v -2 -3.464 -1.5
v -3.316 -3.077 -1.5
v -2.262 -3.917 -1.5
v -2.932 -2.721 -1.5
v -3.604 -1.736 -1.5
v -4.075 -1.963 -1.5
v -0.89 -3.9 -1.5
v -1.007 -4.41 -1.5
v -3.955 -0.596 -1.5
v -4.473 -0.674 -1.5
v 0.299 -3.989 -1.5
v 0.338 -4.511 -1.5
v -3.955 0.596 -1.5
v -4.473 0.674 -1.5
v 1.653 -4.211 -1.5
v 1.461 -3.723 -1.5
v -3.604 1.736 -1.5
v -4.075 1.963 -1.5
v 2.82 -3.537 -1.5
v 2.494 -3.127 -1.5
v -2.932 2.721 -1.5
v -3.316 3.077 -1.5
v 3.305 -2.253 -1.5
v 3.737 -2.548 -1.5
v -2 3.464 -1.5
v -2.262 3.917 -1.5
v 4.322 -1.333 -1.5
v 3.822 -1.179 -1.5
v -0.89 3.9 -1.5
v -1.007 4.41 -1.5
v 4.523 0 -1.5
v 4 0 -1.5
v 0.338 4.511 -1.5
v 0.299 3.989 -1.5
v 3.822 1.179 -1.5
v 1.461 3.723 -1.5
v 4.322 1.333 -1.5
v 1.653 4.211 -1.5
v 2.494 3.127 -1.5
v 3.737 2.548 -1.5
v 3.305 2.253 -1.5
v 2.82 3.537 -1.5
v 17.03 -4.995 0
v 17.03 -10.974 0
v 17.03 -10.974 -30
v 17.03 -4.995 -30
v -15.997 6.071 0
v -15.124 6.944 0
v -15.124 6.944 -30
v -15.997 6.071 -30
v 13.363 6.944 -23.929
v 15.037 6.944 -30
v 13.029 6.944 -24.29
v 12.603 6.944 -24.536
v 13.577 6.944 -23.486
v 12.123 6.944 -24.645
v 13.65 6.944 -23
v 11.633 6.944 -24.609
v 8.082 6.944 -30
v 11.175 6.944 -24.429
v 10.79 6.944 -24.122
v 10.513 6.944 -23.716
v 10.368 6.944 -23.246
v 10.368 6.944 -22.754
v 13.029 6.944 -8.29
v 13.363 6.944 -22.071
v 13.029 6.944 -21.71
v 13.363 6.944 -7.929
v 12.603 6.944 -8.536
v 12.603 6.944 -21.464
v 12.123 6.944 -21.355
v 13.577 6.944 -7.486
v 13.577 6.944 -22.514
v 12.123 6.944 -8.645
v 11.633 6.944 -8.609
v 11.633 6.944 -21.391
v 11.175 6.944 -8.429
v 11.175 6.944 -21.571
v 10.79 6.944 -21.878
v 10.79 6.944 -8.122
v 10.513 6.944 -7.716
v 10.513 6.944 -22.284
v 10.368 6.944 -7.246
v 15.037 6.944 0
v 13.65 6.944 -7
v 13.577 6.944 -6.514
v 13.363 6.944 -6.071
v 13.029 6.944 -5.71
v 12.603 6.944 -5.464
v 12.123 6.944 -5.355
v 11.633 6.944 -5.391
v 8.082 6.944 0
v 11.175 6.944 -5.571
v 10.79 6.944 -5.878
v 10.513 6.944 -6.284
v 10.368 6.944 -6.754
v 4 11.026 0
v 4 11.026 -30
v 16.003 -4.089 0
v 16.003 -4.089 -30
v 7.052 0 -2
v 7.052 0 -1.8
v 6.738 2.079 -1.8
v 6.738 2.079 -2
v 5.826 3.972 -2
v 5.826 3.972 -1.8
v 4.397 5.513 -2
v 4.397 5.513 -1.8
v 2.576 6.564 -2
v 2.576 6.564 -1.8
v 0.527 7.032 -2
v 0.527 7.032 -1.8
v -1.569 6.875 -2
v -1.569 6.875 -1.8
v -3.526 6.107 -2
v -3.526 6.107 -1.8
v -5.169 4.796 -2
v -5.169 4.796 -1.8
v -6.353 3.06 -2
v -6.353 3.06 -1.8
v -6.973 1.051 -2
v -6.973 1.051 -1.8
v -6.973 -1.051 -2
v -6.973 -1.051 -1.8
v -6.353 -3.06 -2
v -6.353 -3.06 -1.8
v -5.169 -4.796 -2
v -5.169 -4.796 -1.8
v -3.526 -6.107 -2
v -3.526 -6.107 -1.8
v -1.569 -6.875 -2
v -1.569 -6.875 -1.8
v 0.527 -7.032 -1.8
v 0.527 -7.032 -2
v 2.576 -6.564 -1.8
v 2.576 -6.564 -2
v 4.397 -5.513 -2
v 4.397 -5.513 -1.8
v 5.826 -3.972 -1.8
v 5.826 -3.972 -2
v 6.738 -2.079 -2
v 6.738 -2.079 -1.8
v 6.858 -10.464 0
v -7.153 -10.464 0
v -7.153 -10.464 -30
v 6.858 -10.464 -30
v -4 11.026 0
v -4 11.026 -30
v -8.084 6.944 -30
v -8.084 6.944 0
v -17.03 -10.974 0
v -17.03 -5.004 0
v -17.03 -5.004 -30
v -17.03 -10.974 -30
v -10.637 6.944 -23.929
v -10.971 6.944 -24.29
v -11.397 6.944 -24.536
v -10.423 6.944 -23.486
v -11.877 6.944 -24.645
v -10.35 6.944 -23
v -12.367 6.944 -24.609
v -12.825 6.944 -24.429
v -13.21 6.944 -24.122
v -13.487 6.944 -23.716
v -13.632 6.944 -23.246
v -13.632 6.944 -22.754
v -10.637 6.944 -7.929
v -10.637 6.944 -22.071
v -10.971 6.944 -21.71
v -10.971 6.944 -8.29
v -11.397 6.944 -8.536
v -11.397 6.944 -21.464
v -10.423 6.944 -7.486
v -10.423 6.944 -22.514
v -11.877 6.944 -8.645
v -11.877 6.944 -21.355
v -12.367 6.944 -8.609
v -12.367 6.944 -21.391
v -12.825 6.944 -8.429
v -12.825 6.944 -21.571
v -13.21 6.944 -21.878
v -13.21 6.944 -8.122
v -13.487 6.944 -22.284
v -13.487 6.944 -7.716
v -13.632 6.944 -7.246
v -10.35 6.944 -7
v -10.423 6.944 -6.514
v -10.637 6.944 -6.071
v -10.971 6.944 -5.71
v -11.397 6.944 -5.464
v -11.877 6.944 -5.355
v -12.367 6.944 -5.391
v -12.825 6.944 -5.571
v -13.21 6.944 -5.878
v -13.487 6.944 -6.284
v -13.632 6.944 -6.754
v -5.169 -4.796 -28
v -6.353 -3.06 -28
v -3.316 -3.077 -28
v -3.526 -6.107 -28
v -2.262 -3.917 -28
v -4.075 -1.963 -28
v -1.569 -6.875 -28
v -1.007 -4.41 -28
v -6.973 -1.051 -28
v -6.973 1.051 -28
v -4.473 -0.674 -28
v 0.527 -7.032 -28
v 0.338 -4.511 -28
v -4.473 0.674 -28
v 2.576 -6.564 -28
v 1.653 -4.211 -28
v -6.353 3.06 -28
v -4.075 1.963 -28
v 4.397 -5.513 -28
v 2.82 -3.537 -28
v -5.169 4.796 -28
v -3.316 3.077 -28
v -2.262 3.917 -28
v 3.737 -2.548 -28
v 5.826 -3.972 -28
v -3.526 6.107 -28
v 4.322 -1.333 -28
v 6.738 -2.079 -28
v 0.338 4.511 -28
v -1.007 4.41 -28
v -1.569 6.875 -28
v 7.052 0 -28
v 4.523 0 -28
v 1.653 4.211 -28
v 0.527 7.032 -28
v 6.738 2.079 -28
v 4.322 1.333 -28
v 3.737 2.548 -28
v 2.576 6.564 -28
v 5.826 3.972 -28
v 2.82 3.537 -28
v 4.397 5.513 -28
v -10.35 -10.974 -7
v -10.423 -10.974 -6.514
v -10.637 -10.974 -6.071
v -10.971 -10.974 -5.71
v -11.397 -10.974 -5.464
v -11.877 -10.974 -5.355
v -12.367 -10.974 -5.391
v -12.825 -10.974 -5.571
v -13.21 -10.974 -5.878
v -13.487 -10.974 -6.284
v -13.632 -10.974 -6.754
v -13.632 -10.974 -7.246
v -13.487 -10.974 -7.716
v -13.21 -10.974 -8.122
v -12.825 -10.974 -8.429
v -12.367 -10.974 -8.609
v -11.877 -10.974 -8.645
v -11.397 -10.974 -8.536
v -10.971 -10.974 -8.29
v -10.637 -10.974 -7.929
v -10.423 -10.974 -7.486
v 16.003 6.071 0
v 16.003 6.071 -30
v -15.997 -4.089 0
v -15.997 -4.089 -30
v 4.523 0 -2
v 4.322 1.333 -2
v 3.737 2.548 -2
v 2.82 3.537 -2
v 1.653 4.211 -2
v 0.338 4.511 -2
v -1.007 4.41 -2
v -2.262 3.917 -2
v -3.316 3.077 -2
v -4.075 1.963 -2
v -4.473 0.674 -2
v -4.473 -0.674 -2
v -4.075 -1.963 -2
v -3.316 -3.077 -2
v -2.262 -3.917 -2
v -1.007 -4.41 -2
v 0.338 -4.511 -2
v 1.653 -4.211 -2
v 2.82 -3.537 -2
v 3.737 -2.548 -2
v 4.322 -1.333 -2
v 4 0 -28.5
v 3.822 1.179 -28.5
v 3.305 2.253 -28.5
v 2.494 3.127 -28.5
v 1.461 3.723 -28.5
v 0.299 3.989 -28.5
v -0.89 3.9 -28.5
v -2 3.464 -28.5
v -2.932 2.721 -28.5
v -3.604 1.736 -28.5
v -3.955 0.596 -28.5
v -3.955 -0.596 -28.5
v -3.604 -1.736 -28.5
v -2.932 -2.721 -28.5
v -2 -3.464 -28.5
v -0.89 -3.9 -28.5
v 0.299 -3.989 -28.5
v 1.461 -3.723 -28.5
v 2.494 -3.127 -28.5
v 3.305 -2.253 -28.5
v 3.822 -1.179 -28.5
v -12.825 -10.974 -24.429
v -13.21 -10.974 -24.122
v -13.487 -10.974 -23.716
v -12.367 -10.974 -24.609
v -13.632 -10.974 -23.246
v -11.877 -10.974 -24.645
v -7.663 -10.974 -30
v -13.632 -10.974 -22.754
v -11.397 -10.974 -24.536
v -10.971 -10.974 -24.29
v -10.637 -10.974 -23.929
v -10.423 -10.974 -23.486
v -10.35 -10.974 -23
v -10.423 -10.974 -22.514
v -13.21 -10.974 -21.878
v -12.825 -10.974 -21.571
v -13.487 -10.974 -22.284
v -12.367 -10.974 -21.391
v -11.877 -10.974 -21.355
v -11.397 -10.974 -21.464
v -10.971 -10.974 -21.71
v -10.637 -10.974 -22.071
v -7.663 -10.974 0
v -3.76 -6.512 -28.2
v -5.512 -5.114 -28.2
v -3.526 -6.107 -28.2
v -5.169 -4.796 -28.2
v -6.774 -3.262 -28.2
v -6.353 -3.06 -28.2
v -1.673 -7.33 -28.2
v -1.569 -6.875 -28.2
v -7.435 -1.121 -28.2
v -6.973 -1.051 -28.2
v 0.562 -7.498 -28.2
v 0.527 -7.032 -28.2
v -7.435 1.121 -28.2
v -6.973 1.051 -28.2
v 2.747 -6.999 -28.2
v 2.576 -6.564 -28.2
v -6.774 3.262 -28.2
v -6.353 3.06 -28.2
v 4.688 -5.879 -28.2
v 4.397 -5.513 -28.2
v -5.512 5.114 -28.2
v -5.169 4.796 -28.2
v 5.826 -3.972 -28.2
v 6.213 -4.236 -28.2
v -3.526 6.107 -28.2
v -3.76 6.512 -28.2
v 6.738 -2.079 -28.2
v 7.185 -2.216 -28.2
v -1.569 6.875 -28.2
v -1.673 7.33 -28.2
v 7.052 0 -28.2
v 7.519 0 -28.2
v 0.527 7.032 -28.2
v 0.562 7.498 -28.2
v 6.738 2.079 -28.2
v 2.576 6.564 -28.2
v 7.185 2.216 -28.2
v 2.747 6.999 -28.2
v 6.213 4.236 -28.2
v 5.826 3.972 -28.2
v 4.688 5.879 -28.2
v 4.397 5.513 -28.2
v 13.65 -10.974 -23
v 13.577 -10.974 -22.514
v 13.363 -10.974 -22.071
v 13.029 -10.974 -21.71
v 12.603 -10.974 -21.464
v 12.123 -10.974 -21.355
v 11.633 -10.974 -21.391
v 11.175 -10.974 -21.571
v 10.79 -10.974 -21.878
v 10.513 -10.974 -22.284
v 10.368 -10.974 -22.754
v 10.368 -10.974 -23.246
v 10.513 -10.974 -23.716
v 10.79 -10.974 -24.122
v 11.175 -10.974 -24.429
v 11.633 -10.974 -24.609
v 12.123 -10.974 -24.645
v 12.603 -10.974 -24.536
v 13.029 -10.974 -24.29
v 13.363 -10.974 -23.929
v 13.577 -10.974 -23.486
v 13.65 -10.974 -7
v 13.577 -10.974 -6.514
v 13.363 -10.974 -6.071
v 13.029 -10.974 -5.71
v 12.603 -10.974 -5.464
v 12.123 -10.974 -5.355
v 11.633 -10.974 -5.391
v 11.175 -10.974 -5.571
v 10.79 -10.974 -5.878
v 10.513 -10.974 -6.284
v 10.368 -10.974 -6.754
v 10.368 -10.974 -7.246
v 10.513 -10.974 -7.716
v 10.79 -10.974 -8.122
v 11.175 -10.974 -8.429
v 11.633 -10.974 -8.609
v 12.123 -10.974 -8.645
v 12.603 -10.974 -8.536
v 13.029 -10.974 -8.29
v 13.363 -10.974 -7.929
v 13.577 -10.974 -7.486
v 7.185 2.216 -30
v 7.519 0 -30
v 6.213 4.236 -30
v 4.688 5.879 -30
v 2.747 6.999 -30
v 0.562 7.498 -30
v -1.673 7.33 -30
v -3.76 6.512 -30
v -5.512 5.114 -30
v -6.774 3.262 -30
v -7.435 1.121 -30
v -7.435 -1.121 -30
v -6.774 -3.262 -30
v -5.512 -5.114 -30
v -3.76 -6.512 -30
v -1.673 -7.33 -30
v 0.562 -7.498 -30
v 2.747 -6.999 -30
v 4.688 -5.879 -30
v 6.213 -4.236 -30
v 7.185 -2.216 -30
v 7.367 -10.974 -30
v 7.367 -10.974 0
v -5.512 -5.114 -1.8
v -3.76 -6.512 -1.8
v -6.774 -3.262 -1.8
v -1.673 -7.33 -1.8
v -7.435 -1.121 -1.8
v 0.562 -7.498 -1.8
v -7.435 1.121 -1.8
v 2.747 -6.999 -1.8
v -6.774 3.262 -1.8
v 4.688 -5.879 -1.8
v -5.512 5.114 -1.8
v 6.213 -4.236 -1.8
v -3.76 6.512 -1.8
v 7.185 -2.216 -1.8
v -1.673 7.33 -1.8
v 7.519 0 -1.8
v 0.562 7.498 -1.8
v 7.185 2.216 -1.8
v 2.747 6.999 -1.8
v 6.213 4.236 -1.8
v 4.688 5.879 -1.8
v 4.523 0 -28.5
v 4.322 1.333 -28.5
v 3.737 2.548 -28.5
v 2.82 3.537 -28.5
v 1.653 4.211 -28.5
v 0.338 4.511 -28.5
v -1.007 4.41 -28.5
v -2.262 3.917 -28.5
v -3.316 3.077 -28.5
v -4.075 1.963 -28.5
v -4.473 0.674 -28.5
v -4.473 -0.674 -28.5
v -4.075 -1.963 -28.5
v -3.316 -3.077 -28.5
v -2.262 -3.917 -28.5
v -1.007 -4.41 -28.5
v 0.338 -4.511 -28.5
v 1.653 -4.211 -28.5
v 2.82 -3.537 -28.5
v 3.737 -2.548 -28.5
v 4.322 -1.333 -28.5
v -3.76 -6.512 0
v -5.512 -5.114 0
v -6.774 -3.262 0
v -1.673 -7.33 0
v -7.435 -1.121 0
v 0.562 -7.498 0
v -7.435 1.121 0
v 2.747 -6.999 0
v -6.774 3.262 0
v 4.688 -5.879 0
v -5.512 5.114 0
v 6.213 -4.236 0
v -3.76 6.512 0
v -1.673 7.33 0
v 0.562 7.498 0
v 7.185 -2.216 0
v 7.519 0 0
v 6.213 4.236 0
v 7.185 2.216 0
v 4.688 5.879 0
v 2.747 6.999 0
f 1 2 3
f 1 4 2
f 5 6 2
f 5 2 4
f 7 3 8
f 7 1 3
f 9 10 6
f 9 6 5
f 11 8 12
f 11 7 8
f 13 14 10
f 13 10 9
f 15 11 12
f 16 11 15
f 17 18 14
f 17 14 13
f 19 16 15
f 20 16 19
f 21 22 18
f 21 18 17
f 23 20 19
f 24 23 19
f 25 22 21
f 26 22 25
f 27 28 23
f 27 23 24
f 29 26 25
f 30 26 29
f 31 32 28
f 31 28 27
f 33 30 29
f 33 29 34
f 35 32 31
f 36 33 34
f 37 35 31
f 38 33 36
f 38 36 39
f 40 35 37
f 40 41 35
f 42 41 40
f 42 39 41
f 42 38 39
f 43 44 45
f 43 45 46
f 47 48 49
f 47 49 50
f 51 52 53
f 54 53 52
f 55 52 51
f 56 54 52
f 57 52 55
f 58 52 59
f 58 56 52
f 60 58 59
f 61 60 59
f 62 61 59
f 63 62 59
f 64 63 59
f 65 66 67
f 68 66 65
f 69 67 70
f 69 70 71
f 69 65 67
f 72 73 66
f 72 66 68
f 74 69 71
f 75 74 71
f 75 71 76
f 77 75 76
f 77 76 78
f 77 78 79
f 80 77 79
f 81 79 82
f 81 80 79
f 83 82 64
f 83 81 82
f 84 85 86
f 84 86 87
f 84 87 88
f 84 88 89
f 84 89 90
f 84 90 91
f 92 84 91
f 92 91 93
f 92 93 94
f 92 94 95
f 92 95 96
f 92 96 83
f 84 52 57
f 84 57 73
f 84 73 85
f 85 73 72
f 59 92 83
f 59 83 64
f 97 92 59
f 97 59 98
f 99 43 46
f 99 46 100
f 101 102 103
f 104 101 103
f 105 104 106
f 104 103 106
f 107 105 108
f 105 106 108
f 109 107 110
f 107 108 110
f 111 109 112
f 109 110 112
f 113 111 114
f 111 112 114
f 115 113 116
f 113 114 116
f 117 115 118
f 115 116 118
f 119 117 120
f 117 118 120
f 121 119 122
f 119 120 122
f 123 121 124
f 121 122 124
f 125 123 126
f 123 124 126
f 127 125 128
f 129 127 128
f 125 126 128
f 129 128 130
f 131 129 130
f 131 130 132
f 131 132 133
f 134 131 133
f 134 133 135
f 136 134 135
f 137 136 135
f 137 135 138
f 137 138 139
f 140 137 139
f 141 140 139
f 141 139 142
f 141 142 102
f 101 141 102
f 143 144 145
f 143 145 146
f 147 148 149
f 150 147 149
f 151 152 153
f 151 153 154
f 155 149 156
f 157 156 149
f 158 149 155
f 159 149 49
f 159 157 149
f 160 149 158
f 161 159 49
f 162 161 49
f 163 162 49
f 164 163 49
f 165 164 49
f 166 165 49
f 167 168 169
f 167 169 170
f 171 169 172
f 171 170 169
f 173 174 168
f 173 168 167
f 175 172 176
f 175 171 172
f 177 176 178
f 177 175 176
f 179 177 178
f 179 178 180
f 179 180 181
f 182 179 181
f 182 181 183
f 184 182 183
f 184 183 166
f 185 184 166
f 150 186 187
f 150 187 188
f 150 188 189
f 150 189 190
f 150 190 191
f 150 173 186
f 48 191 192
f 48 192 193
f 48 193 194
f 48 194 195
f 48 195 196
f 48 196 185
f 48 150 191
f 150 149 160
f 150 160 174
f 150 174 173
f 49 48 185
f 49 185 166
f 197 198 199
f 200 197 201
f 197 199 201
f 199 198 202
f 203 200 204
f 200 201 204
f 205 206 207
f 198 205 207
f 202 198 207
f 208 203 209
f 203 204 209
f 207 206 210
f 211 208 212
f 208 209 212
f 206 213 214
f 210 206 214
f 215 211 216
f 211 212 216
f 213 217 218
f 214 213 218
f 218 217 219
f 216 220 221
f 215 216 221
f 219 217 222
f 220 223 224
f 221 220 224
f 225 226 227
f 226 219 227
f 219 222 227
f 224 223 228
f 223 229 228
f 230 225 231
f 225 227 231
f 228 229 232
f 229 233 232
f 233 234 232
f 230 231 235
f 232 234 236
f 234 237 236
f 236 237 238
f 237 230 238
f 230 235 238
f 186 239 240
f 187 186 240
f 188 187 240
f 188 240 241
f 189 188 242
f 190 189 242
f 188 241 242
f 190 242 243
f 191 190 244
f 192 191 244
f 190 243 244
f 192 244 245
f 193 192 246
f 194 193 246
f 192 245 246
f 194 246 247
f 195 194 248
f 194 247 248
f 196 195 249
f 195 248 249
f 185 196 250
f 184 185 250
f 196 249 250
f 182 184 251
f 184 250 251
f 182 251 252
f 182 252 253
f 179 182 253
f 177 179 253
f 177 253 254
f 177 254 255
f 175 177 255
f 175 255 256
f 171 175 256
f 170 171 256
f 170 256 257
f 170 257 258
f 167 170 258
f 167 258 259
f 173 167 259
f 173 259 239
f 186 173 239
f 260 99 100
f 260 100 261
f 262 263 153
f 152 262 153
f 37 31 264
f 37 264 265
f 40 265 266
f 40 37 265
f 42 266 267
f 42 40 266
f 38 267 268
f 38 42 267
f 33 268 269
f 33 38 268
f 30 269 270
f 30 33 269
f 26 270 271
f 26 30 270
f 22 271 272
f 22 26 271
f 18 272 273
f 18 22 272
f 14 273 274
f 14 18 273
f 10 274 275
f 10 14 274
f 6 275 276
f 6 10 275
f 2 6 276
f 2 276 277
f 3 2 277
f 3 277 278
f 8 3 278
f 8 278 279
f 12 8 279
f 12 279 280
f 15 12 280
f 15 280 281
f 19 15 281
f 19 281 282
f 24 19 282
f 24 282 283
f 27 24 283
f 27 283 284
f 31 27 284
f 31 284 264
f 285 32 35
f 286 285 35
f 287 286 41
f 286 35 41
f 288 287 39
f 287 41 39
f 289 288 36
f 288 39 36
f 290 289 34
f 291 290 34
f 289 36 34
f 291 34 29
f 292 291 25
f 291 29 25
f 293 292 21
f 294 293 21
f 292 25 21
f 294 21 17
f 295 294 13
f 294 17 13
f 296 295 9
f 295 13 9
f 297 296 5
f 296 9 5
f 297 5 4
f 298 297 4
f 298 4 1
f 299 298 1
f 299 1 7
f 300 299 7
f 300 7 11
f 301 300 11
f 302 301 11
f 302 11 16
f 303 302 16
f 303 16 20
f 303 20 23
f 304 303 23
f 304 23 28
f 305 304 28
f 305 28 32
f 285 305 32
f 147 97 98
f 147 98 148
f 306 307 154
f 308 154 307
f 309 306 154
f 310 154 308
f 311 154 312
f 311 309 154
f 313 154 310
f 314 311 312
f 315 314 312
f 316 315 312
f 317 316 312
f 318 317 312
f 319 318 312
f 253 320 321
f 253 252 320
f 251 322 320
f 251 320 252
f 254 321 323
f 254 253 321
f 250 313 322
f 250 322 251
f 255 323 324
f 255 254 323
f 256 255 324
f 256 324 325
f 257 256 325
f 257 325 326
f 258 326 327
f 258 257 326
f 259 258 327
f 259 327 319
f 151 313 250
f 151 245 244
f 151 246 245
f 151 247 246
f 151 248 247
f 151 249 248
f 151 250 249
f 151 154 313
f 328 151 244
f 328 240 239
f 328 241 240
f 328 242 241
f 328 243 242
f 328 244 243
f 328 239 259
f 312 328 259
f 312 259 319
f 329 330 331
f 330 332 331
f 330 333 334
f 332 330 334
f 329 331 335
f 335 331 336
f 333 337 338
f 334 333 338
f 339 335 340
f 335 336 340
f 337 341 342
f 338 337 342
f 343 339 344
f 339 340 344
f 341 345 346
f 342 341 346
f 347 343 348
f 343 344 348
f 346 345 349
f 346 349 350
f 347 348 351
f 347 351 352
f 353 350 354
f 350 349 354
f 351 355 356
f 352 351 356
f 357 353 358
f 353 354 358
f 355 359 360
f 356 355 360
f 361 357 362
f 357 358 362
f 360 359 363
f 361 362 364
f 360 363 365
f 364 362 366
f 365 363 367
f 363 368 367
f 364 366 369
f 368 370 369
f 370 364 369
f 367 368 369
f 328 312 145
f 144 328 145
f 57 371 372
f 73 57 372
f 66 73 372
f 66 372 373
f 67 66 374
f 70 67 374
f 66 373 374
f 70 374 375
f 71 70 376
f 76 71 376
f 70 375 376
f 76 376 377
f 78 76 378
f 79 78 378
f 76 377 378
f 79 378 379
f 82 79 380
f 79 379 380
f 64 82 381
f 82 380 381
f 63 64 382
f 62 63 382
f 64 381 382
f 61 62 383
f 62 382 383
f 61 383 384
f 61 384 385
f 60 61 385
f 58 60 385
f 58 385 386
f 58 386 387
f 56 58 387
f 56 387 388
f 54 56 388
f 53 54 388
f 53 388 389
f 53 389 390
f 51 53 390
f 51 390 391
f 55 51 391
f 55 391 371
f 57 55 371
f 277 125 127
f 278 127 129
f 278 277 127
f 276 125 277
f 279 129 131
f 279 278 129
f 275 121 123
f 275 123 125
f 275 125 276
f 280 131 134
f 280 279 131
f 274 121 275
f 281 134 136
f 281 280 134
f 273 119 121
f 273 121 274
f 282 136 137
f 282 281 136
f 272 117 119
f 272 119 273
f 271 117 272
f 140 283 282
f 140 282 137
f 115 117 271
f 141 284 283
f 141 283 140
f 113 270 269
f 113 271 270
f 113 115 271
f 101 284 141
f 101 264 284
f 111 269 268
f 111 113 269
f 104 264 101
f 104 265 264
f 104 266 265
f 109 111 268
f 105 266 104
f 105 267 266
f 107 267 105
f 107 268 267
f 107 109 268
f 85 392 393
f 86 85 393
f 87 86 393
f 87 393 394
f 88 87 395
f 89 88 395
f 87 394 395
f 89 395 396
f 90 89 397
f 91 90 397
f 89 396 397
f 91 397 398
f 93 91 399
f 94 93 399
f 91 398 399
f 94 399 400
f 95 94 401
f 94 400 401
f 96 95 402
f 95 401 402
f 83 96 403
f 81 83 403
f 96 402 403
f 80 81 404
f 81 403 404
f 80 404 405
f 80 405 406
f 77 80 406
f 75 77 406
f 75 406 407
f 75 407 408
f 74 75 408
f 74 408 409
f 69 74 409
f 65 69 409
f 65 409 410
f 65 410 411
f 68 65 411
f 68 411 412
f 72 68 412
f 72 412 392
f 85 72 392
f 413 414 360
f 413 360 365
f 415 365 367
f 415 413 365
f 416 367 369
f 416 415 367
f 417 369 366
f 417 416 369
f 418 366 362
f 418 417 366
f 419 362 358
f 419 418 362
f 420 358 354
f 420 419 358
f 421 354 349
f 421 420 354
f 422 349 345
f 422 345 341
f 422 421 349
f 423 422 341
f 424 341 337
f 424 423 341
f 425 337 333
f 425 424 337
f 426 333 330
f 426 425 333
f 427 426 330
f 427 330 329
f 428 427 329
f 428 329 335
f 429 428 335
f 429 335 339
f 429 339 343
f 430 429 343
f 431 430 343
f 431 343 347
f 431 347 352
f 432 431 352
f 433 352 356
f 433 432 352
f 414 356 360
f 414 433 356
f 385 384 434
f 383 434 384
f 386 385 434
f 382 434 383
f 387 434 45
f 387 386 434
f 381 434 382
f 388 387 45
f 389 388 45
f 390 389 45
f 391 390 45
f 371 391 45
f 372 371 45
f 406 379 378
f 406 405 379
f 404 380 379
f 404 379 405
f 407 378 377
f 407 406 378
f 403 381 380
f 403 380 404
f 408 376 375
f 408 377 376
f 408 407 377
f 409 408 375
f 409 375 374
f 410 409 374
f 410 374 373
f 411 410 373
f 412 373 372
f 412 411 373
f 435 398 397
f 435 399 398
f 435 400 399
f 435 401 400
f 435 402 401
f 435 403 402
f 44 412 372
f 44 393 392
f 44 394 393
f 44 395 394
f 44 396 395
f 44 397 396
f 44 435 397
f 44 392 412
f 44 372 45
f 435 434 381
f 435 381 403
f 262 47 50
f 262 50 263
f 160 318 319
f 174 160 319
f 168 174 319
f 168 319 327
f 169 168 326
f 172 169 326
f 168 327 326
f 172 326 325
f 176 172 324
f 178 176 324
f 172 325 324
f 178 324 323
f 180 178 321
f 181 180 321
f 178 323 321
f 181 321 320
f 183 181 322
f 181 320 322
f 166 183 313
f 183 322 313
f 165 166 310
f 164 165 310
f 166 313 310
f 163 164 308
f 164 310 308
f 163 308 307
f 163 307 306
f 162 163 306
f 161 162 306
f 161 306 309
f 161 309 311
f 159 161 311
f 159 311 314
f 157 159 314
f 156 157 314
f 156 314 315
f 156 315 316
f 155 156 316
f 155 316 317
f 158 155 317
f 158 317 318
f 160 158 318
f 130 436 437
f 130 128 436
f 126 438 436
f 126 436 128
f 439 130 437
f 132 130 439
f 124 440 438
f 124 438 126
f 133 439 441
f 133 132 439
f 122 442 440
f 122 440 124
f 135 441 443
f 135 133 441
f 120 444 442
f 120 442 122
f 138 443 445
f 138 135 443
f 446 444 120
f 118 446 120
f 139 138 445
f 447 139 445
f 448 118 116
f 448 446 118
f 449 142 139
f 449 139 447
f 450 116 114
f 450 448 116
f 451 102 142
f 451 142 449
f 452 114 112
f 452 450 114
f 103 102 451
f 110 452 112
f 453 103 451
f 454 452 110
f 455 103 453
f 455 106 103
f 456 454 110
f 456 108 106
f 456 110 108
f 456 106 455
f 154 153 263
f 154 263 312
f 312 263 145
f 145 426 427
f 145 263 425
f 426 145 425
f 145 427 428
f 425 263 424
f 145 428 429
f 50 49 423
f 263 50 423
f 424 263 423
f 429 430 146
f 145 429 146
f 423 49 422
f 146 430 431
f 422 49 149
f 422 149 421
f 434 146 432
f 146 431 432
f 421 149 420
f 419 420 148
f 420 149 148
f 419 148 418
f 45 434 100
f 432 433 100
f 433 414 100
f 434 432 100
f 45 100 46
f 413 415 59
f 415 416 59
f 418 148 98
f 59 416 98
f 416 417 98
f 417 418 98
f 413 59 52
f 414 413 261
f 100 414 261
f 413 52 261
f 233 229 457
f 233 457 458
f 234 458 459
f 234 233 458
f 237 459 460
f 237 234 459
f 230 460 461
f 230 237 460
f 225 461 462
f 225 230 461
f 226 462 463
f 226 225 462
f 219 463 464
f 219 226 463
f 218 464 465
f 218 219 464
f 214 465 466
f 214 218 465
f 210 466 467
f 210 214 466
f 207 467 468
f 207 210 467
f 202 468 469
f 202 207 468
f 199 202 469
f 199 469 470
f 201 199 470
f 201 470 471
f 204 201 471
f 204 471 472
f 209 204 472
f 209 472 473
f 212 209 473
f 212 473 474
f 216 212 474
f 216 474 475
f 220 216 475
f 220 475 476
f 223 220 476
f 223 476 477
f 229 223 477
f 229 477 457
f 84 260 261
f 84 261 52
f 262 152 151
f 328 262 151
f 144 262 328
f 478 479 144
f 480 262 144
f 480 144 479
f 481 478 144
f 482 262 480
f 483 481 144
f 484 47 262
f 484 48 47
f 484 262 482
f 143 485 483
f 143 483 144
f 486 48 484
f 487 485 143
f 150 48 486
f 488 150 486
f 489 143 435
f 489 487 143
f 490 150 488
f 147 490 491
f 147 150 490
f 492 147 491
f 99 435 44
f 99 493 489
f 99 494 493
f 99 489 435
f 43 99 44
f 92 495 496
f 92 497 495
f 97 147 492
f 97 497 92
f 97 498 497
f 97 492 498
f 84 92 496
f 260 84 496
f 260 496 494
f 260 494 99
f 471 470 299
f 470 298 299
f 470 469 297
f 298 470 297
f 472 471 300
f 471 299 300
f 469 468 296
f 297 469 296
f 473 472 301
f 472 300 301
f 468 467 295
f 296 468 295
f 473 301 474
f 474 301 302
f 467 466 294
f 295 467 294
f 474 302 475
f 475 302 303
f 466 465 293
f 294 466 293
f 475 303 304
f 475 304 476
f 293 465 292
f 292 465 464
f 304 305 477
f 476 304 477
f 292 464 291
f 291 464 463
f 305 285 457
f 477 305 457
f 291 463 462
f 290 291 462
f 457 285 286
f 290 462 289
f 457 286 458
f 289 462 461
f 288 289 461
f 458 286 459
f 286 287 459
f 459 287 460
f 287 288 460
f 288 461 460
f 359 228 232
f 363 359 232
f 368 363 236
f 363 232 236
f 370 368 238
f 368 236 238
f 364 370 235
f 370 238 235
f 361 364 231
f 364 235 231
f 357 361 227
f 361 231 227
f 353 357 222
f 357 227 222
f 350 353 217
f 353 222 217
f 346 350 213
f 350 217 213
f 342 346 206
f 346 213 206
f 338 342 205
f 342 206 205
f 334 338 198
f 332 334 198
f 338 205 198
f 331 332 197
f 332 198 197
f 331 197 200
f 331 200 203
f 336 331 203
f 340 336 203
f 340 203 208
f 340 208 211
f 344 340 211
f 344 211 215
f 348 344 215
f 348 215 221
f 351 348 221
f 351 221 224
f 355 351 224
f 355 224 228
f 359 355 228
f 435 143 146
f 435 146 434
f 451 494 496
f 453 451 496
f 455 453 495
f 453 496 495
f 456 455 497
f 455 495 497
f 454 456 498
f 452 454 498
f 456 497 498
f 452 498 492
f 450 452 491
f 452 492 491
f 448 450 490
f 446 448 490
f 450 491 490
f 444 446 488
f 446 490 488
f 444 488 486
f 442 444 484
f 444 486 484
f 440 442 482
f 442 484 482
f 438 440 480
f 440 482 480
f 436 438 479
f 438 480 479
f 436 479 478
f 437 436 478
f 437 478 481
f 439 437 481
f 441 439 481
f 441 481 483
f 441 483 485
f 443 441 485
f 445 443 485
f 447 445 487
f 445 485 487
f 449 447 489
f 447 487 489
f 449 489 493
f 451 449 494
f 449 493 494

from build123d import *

# Parameters (mm, degrees)
ESQUISSE1_R             = 7.519017315
BOSS_EXTRU_1_DEPTH      = 30
ESQUISSE1_3_R           = 7.051788316
ESQUISSE1_3_R_2         = 4.523392982
BOSS_EXTRU_2_DEPTH      = 28
ESQUISSE1_4_R           = 7.519017315
ESQUISSE1_4_R_2         = 7.051788316
BOSS_EXTRU_3_DEPTH      = 30
ESQUISSE1_5_R           = 4.523392982
ESQUISSE1_5_R_2         = 4
BOSS_EXTRU_4_DEPTH      = 28.5
ESQUISSE1_6_R           = 4.523392982
ESQUISSE1_6_R_2         = 4
ENL_V_MAT_EXTRU_1_DEPTH = 1.5
ESQUISSE1_7_R           = 7.051788316
ESQUISSE1_7_R_2         = 4.523392982
ENL_V_MAT_EXTRU_2_DEPTH = 2
ESQUISSE1_8_R           = 7.519017315
ESQUISSE1_8_R_2         = 7.051788316
ENL_V_MAT_EXTRU_3_DEPTH = 1.8
ENL_V_START             = -30
ESQUISSE1_9_R           = 7.519017315
ESQUISSE1_9_R_2         = 7.051788316
ENL_V_MAT_EXTRU_4_DEPTH = 1.8
ESQUISSE2_R             = 1.65
ENL_V_MAT_EXTRU_5_DEPTH = 21.8


with BuildPart() as part:
    # Esquisse1 → Boss.-Extru.1 (new body)
    with BuildSketch(Plane.XY):
        Polygon((-15.997216081, -4.089203195), (-17.03, -5.004453984), (-17.03, -10.973805396), (-7.66267479, -10.973805396), (-7.153229177, -10.464359784), (6.857616233, -10.464359784), (7.367061846, -10.973805396), (17.03, -10.973805396), (17.03, -4.995255883), (16.002783919, -4.089203195), (16.002783919, 6.07141612), (15.037454618, 6.944265115), (8.081929489, 6.944265115), (4, 11.026194604), (-4, 11.026194604), (-8.083891517, 6.944265115), (-15.124367087, 6.944265115), (-15.997216081, 6.07141612), align=None)
        Circle(ESQUISSE1_R, mode=Mode.SUBTRACT)
    extrude(amount=-BOSS_EXTRU_1_DEPTH)



with BuildPart() as body_2:
    # Esquisse1_3 → Boss.-Extru.2 (new body)
    with BuildSketch(Plane.XY):
        Circle(ESQUISSE1_3_R)
        Circle(ESQUISSE1_3_R_2, mode=Mode.SUBTRACT)
    extrude(amount=-BOSS_EXTRU_2_DEPTH)


with BuildPart() as part_1:
    add(part.part)

    add(body_2.part)  # Boss.-Extru.3 merges body 2
    # Esquisse1_4 → Boss.-Extru.3 (add)
    with BuildSketch(Plane.XY):
        Circle(ESQUISSE1_4_R)
        Circle(ESQUISSE1_4_R_2, mode=Mode.SUBTRACT)
    extrude(amount=-BOSS_EXTRU_3_DEPTH)

    # Esquisse1_5 → Boss.-Extru.4 (add)
    with BuildSketch(Plane.XY):
        Circle(ESQUISSE1_5_R)
        Circle(ESQUISSE1_5_R_2, mode=Mode.SUBTRACT)
    extrude(amount=-BOSS_EXTRU_4_DEPTH)

    # Esquisse1_6 → Enl_v. mat.-Extru.1 (cut)
    with BuildSketch(Plane.XY):
        Circle(ESQUISSE1_6_R)
        Circle(ESQUISSE1_6_R_2, mode=Mode.SUBTRACT)
    extrude(amount=-ENL_V_MAT_EXTRU_1_DEPTH, mode=Mode.SUBTRACT)

    # Esquisse1_7 → Enl_v. mat.-Extru.2 (cut)
    with BuildSketch(Plane.XY):
        Circle(ESQUISSE1_7_R)
        Circle(ESQUISSE1_7_R_2, mode=Mode.SUBTRACT)
    extrude(amount=-ENL_V_MAT_EXTRU_2_DEPTH, mode=Mode.SUBTRACT)

    # Esquisse1_8 → Enl_v. mat.-Extru.3 (cut)
    with BuildSketch(Plane.XY):
        Circle(ESQUISSE1_8_R)
        Circle(ESQUISSE1_8_R_2, mode=Mode.SUBTRACT)
    extrude(amount=-ENL_V_MAT_EXTRU_3_DEPTH, mode=Mode.SUBTRACT)

    # Esquisse1_9 → Enl_v. mat.-Extru.4 (cut)
    with BuildSketch(Plane.XY.offset(ENL_V_START)):
        Circle(ESQUISSE1_9_R)
        Circle(ESQUISSE1_9_R_2, mode=Mode.SUBTRACT)
    extrude(amount=ENL_V_MAT_EXTRU_4_DEPTH, mode=Mode.SUBTRACT)

    # Esquisse2 → Enl_v. mat.-Extru.5 (cut)
    with BuildSketch(Plane.XZ.offset(10.973805396)):
        with Locations((-12, -7)):
            Circle(ESQUISSE2_R)
        with Locations((12, -7)):
            Circle(ESQUISSE2_R)
        with Locations((12, -23)):
            Circle(ESQUISSE2_R)
        with Locations((-12, -23)):
            Circle(ESQUISSE2_R)
    extrude(amount=-ENL_V_MAT_EXTRU_5_DEPTH, mode=Mode.SUBTRACT)


solid = part_1.part
